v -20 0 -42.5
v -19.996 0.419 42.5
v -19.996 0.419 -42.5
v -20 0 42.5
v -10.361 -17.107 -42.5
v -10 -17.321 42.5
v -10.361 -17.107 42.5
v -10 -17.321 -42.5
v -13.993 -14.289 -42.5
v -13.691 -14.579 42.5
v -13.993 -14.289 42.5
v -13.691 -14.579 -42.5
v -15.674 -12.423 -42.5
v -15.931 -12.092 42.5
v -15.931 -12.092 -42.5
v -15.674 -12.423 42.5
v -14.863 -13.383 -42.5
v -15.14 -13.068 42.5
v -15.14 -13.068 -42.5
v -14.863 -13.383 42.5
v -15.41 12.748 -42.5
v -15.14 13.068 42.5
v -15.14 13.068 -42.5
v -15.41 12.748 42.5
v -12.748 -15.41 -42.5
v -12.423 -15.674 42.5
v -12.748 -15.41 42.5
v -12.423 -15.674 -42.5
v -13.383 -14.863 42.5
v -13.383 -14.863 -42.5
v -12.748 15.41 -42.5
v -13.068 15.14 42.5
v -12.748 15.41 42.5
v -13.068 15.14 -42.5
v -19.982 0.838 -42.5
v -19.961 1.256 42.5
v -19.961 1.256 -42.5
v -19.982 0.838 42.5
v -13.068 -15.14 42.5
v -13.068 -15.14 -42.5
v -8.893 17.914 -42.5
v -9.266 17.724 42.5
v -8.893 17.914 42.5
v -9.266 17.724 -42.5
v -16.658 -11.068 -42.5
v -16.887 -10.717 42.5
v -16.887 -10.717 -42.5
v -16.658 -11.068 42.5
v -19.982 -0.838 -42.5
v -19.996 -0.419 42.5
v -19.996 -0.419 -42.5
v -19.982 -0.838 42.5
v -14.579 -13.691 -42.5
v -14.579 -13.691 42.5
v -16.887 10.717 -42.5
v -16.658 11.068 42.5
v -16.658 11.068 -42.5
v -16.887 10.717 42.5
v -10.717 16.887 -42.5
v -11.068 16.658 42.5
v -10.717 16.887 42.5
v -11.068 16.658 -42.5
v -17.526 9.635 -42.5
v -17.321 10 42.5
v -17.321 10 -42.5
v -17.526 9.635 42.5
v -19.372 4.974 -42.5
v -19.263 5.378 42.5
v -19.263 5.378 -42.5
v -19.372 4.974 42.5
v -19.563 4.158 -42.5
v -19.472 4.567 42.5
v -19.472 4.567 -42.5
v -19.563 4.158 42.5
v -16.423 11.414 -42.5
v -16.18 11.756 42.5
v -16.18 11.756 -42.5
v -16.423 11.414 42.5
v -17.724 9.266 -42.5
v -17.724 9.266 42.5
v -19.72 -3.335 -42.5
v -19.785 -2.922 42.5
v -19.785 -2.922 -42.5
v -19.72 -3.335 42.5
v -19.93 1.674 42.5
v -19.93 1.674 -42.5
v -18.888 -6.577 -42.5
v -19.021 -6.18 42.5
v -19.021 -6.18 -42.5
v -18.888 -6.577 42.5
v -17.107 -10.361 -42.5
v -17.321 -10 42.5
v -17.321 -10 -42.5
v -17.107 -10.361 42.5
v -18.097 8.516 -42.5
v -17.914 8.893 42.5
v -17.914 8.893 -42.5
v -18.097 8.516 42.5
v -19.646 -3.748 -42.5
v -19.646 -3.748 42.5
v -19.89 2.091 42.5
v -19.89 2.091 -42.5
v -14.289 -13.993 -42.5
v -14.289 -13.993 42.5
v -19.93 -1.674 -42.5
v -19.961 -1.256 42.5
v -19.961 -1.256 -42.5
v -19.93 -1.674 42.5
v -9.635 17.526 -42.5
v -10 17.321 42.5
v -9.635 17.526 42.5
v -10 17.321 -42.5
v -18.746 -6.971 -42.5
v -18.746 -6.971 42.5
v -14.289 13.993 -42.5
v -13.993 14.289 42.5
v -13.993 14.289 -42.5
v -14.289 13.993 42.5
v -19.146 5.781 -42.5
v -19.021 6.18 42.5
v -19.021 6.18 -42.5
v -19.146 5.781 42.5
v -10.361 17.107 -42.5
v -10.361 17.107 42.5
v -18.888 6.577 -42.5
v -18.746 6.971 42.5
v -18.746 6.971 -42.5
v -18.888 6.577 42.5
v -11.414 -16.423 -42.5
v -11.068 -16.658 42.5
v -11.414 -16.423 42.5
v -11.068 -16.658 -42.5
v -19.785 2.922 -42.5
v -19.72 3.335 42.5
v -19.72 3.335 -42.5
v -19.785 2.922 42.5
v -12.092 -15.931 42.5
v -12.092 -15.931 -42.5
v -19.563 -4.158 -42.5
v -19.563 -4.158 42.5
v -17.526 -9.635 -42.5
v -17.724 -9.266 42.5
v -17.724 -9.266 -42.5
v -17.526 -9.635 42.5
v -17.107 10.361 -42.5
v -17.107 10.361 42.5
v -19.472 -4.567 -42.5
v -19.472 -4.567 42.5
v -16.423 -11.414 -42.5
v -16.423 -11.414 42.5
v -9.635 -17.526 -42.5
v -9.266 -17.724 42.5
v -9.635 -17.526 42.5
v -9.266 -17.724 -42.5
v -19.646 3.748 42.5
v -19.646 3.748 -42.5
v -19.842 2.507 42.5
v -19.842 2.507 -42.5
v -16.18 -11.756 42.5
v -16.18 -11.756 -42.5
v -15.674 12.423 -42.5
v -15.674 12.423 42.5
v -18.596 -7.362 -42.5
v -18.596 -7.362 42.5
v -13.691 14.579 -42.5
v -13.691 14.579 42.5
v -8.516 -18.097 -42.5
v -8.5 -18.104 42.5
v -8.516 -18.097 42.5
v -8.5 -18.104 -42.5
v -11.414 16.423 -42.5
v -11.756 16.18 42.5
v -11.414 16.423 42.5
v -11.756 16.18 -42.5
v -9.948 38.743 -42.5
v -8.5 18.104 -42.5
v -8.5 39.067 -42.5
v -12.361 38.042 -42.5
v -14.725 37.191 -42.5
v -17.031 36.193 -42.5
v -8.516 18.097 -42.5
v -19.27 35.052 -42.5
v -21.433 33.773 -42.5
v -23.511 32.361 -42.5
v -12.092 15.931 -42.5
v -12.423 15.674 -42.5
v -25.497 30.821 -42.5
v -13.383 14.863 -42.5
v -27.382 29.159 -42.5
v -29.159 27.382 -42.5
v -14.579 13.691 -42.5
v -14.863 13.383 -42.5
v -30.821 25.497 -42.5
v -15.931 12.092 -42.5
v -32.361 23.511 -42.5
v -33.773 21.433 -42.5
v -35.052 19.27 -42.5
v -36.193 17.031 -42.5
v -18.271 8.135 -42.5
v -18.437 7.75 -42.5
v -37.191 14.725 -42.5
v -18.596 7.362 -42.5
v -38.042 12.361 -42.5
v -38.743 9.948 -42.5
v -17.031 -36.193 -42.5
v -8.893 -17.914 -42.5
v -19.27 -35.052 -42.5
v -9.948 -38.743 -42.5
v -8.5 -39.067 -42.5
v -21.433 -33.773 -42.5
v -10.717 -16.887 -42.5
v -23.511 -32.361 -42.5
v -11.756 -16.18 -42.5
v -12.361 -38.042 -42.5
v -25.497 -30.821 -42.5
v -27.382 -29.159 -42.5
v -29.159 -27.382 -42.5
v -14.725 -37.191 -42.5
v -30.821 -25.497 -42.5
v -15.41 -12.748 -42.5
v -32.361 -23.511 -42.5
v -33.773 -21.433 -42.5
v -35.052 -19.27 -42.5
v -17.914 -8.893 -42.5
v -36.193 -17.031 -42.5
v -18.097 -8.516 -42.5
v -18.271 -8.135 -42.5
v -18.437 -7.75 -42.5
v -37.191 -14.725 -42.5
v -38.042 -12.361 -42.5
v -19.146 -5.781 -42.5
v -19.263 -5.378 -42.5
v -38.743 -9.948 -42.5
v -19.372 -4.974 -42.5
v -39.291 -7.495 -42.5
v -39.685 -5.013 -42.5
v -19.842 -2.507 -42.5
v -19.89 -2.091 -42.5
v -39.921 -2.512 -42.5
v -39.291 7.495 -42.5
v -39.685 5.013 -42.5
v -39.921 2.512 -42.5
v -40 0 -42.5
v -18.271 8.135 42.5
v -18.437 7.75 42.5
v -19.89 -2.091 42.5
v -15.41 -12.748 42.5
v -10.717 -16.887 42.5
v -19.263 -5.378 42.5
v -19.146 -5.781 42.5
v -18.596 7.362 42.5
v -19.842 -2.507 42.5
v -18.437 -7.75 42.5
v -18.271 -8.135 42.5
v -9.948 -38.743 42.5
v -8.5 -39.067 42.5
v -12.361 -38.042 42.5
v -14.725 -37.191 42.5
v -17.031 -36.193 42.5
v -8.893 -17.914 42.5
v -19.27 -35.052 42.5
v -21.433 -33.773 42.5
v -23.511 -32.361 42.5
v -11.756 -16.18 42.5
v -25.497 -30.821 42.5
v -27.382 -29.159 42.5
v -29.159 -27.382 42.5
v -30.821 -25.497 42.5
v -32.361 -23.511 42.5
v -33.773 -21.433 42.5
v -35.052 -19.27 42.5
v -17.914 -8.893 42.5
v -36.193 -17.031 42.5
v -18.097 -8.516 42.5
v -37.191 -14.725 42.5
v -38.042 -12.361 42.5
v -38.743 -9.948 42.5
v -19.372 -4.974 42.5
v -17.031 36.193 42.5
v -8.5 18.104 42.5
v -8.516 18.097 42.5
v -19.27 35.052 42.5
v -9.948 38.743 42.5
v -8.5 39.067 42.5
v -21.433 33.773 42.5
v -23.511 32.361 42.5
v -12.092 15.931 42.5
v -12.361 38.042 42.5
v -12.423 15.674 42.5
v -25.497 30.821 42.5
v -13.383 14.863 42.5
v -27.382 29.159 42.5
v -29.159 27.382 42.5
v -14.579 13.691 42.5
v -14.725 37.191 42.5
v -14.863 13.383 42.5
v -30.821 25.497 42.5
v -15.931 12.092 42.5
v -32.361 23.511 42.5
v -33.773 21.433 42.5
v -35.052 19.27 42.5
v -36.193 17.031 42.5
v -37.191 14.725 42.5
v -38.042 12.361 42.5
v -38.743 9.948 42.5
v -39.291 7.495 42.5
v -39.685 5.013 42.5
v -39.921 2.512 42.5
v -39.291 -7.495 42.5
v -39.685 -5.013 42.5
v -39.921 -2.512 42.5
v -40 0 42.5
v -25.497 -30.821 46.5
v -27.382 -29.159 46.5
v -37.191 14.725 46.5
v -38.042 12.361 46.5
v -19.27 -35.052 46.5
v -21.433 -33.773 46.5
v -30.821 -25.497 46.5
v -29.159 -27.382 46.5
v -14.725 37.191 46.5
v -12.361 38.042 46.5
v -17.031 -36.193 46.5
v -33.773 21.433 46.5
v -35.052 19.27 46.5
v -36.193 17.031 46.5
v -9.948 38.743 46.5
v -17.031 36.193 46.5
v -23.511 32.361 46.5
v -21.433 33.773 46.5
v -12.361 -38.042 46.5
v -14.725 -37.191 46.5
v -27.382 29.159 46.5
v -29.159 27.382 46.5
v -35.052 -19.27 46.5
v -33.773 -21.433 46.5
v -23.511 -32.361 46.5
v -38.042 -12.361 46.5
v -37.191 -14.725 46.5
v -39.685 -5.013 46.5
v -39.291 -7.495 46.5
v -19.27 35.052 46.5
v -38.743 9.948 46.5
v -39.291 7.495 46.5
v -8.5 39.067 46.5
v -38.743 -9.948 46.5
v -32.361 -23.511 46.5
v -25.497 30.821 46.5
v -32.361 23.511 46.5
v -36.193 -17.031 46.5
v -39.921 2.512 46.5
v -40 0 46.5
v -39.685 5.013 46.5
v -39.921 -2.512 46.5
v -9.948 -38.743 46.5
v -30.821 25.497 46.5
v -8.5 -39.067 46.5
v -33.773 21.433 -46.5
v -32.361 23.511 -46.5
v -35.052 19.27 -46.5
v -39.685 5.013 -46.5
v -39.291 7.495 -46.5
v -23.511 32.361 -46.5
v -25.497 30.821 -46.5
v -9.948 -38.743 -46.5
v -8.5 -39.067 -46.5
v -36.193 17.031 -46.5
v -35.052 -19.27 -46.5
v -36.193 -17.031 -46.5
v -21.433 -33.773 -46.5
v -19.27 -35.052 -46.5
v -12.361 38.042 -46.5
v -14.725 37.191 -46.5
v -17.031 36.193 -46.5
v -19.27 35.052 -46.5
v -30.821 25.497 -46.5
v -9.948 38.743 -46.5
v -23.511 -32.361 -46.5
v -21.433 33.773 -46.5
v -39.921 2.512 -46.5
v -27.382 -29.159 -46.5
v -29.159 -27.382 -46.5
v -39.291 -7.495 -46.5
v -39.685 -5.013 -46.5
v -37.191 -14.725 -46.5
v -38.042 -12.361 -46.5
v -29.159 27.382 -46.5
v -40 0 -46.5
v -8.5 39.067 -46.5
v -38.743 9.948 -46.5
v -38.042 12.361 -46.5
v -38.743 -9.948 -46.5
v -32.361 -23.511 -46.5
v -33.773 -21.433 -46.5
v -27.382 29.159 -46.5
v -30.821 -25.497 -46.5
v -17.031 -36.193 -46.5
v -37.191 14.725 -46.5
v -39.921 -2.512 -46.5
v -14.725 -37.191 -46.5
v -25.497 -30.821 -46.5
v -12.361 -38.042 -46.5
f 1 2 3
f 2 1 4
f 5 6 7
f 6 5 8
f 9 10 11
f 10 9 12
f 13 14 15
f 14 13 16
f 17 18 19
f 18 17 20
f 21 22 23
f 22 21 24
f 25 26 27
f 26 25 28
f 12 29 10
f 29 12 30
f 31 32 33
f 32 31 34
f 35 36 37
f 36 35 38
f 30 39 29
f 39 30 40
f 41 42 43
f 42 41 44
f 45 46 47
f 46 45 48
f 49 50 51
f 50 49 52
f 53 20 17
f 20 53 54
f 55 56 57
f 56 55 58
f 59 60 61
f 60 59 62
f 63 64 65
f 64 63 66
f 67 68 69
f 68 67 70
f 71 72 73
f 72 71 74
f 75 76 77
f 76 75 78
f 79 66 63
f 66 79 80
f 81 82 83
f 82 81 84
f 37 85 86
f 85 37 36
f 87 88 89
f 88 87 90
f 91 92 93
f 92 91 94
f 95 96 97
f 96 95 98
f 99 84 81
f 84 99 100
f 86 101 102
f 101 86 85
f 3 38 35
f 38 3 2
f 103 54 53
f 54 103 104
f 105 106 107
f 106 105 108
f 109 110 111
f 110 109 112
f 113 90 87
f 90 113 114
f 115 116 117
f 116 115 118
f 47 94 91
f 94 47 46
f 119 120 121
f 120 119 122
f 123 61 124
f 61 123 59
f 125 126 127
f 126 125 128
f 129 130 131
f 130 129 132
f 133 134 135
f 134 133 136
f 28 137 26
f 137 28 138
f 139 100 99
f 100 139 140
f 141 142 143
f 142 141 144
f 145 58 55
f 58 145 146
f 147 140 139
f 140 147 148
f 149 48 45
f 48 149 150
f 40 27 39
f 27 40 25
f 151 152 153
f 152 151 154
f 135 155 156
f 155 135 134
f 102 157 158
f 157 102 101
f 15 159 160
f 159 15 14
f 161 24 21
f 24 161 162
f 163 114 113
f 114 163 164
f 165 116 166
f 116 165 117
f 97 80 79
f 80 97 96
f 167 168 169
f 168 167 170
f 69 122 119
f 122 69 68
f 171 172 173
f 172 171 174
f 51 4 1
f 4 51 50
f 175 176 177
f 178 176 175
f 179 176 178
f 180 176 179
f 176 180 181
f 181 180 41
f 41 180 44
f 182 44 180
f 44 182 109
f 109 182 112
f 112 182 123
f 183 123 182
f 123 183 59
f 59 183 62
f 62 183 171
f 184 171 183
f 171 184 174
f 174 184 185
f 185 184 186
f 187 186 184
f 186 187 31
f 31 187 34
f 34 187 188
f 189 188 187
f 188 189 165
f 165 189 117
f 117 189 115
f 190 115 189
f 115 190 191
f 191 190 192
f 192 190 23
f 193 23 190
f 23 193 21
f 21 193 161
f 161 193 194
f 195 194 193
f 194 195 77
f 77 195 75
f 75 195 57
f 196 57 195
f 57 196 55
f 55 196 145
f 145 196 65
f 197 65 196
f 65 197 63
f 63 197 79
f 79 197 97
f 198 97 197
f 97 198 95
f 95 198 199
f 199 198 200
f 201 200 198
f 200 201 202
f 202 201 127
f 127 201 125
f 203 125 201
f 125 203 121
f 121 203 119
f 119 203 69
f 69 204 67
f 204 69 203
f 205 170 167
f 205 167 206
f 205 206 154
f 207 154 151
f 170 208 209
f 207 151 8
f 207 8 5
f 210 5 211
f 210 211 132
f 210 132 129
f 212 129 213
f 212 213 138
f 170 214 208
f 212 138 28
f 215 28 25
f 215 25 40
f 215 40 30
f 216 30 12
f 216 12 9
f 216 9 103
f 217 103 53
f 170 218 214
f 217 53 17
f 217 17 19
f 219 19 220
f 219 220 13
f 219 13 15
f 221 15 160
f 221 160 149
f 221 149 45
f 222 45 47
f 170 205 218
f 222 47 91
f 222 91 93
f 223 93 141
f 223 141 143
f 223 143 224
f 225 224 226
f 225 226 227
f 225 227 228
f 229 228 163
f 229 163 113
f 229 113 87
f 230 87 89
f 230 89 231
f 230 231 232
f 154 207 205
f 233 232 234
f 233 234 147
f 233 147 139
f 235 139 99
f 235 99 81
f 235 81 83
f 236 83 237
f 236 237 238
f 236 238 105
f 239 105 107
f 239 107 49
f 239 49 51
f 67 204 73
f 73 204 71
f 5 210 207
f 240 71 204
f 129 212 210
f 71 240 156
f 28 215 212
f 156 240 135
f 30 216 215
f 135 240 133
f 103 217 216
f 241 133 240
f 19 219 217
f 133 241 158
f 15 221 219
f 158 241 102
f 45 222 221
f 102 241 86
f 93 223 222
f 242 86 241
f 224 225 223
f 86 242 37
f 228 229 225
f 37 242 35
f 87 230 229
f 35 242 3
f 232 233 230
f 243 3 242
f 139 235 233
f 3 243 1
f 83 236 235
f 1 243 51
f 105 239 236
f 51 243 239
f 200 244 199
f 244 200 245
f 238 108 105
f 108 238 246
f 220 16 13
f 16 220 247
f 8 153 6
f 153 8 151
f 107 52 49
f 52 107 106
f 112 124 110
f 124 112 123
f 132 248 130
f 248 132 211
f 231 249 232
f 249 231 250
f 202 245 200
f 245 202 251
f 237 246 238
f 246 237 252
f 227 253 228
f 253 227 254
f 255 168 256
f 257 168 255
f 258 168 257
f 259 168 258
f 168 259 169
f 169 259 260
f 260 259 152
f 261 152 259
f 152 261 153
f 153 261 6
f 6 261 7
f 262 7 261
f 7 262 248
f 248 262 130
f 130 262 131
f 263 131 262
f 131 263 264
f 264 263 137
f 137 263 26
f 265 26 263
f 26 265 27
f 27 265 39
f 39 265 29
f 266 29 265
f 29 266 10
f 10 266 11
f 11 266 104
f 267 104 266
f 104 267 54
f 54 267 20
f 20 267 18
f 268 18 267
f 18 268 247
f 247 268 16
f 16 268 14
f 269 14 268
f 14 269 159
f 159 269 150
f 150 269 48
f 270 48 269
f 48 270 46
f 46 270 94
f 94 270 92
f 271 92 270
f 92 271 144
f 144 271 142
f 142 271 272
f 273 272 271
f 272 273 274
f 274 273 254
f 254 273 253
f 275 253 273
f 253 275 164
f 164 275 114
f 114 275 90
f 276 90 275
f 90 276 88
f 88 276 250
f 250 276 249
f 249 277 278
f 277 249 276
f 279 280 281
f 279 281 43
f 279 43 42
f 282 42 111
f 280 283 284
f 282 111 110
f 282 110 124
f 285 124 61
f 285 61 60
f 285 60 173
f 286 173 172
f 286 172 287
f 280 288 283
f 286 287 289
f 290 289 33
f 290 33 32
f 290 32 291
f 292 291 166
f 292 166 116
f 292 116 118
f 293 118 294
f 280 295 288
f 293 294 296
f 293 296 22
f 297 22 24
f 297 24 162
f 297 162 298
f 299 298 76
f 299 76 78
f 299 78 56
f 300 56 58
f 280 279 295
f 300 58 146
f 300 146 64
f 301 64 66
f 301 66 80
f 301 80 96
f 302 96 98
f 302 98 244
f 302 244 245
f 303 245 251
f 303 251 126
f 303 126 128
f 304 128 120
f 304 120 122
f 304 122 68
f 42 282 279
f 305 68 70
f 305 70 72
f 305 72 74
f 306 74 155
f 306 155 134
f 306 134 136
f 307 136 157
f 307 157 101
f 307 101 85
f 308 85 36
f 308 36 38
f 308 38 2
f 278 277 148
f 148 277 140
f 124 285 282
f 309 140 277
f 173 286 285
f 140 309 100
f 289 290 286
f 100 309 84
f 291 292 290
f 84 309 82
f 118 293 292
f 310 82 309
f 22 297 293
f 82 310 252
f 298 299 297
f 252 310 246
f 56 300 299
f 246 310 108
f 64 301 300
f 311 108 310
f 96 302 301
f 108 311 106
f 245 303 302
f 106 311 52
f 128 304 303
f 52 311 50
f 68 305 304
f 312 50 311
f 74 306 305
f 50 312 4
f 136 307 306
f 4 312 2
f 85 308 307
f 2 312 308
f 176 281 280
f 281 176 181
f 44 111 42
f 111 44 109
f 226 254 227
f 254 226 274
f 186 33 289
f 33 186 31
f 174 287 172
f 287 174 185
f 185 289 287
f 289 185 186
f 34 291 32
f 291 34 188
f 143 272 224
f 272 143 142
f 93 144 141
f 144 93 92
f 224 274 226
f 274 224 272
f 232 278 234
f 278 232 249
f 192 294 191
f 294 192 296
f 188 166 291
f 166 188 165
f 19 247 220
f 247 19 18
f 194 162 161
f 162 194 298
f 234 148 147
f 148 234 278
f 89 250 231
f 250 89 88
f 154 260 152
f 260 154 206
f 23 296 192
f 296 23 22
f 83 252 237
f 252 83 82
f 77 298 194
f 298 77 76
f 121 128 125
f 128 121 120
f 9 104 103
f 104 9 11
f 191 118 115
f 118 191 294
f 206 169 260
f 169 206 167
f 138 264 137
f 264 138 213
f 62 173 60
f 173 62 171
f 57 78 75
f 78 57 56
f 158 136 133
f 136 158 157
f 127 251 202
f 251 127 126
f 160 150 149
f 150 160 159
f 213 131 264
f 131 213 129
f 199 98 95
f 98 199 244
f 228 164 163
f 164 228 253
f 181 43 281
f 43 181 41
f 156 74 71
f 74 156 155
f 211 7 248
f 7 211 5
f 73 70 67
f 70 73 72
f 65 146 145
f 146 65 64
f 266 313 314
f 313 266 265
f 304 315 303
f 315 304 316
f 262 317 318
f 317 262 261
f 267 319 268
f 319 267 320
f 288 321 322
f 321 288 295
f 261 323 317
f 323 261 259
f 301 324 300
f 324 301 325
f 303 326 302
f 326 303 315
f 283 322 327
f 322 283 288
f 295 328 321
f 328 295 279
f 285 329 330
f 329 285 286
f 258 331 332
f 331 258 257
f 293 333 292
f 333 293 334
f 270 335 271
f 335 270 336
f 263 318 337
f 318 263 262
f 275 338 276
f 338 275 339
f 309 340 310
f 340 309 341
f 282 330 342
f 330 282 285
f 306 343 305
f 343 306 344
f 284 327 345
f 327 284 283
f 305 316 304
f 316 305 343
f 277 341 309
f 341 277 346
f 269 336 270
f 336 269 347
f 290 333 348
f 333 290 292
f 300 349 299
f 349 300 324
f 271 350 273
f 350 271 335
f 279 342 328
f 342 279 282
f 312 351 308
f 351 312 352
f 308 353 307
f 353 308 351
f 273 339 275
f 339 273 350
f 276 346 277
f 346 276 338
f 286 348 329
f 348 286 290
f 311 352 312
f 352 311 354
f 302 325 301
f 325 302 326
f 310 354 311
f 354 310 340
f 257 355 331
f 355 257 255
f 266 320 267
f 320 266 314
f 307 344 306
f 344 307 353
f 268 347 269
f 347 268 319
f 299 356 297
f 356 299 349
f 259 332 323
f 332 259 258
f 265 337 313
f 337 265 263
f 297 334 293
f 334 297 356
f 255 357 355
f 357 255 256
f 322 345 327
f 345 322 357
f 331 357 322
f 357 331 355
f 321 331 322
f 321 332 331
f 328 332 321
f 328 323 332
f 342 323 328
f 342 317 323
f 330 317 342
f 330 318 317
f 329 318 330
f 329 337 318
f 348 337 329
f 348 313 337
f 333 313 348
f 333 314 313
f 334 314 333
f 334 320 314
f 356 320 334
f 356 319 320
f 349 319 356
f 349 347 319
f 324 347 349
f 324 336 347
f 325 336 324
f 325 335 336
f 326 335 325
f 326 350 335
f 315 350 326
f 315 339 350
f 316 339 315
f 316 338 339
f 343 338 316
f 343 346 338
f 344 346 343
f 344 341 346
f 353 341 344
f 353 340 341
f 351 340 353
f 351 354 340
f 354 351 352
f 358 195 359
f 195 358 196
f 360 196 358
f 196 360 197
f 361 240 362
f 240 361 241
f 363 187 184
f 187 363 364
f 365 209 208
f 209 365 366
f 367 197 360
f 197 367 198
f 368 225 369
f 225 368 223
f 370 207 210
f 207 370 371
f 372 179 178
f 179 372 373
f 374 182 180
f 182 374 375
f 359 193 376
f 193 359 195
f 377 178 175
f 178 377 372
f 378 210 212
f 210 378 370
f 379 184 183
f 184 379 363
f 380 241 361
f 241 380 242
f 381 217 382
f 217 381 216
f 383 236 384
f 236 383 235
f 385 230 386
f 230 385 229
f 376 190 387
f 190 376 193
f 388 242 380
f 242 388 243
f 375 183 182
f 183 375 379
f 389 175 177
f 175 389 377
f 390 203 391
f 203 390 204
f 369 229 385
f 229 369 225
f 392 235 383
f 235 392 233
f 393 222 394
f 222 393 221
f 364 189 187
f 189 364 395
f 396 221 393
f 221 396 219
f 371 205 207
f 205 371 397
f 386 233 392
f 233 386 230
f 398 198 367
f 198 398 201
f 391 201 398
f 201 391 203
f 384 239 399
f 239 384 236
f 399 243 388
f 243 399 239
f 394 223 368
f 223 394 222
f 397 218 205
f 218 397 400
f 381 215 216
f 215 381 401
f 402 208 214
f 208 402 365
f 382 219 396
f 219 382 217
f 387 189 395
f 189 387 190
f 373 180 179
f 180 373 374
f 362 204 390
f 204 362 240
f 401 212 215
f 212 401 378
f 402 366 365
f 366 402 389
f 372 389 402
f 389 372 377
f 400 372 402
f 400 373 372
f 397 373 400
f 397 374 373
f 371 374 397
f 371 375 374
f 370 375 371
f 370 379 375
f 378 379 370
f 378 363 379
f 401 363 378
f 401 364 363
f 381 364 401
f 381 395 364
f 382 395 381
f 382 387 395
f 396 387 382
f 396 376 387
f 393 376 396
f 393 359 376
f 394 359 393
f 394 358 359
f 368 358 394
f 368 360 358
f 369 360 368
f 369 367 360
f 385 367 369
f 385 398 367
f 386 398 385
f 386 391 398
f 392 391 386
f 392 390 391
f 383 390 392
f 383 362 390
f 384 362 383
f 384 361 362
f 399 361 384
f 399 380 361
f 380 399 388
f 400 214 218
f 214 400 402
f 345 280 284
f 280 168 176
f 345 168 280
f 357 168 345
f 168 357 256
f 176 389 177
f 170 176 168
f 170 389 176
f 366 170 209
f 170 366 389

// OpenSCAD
difference(){
	union(){
       translate([0,0,0]){
            rotate(a = [0,0,0]) {
                cylinder(h=85, r=20, $fn=300, center=true);
            }
       }
       translate([0,0,(89)/2]){
            rotate(a = [0,0,0]) {
                cylinder(h=4, r=40, $fn=100, center=true);
            }
       }
       translate([0,0,-(89)/2]){
            rotate(a = [0,0,0]) {
                cylinder(h=4, r=40, $fn=100, center=true);
            }
       }
       
       

	}
	union() {

        translate([34,0,0]){
           cube([85,100,125], center=true);
        }	   
   


        
	}
}
